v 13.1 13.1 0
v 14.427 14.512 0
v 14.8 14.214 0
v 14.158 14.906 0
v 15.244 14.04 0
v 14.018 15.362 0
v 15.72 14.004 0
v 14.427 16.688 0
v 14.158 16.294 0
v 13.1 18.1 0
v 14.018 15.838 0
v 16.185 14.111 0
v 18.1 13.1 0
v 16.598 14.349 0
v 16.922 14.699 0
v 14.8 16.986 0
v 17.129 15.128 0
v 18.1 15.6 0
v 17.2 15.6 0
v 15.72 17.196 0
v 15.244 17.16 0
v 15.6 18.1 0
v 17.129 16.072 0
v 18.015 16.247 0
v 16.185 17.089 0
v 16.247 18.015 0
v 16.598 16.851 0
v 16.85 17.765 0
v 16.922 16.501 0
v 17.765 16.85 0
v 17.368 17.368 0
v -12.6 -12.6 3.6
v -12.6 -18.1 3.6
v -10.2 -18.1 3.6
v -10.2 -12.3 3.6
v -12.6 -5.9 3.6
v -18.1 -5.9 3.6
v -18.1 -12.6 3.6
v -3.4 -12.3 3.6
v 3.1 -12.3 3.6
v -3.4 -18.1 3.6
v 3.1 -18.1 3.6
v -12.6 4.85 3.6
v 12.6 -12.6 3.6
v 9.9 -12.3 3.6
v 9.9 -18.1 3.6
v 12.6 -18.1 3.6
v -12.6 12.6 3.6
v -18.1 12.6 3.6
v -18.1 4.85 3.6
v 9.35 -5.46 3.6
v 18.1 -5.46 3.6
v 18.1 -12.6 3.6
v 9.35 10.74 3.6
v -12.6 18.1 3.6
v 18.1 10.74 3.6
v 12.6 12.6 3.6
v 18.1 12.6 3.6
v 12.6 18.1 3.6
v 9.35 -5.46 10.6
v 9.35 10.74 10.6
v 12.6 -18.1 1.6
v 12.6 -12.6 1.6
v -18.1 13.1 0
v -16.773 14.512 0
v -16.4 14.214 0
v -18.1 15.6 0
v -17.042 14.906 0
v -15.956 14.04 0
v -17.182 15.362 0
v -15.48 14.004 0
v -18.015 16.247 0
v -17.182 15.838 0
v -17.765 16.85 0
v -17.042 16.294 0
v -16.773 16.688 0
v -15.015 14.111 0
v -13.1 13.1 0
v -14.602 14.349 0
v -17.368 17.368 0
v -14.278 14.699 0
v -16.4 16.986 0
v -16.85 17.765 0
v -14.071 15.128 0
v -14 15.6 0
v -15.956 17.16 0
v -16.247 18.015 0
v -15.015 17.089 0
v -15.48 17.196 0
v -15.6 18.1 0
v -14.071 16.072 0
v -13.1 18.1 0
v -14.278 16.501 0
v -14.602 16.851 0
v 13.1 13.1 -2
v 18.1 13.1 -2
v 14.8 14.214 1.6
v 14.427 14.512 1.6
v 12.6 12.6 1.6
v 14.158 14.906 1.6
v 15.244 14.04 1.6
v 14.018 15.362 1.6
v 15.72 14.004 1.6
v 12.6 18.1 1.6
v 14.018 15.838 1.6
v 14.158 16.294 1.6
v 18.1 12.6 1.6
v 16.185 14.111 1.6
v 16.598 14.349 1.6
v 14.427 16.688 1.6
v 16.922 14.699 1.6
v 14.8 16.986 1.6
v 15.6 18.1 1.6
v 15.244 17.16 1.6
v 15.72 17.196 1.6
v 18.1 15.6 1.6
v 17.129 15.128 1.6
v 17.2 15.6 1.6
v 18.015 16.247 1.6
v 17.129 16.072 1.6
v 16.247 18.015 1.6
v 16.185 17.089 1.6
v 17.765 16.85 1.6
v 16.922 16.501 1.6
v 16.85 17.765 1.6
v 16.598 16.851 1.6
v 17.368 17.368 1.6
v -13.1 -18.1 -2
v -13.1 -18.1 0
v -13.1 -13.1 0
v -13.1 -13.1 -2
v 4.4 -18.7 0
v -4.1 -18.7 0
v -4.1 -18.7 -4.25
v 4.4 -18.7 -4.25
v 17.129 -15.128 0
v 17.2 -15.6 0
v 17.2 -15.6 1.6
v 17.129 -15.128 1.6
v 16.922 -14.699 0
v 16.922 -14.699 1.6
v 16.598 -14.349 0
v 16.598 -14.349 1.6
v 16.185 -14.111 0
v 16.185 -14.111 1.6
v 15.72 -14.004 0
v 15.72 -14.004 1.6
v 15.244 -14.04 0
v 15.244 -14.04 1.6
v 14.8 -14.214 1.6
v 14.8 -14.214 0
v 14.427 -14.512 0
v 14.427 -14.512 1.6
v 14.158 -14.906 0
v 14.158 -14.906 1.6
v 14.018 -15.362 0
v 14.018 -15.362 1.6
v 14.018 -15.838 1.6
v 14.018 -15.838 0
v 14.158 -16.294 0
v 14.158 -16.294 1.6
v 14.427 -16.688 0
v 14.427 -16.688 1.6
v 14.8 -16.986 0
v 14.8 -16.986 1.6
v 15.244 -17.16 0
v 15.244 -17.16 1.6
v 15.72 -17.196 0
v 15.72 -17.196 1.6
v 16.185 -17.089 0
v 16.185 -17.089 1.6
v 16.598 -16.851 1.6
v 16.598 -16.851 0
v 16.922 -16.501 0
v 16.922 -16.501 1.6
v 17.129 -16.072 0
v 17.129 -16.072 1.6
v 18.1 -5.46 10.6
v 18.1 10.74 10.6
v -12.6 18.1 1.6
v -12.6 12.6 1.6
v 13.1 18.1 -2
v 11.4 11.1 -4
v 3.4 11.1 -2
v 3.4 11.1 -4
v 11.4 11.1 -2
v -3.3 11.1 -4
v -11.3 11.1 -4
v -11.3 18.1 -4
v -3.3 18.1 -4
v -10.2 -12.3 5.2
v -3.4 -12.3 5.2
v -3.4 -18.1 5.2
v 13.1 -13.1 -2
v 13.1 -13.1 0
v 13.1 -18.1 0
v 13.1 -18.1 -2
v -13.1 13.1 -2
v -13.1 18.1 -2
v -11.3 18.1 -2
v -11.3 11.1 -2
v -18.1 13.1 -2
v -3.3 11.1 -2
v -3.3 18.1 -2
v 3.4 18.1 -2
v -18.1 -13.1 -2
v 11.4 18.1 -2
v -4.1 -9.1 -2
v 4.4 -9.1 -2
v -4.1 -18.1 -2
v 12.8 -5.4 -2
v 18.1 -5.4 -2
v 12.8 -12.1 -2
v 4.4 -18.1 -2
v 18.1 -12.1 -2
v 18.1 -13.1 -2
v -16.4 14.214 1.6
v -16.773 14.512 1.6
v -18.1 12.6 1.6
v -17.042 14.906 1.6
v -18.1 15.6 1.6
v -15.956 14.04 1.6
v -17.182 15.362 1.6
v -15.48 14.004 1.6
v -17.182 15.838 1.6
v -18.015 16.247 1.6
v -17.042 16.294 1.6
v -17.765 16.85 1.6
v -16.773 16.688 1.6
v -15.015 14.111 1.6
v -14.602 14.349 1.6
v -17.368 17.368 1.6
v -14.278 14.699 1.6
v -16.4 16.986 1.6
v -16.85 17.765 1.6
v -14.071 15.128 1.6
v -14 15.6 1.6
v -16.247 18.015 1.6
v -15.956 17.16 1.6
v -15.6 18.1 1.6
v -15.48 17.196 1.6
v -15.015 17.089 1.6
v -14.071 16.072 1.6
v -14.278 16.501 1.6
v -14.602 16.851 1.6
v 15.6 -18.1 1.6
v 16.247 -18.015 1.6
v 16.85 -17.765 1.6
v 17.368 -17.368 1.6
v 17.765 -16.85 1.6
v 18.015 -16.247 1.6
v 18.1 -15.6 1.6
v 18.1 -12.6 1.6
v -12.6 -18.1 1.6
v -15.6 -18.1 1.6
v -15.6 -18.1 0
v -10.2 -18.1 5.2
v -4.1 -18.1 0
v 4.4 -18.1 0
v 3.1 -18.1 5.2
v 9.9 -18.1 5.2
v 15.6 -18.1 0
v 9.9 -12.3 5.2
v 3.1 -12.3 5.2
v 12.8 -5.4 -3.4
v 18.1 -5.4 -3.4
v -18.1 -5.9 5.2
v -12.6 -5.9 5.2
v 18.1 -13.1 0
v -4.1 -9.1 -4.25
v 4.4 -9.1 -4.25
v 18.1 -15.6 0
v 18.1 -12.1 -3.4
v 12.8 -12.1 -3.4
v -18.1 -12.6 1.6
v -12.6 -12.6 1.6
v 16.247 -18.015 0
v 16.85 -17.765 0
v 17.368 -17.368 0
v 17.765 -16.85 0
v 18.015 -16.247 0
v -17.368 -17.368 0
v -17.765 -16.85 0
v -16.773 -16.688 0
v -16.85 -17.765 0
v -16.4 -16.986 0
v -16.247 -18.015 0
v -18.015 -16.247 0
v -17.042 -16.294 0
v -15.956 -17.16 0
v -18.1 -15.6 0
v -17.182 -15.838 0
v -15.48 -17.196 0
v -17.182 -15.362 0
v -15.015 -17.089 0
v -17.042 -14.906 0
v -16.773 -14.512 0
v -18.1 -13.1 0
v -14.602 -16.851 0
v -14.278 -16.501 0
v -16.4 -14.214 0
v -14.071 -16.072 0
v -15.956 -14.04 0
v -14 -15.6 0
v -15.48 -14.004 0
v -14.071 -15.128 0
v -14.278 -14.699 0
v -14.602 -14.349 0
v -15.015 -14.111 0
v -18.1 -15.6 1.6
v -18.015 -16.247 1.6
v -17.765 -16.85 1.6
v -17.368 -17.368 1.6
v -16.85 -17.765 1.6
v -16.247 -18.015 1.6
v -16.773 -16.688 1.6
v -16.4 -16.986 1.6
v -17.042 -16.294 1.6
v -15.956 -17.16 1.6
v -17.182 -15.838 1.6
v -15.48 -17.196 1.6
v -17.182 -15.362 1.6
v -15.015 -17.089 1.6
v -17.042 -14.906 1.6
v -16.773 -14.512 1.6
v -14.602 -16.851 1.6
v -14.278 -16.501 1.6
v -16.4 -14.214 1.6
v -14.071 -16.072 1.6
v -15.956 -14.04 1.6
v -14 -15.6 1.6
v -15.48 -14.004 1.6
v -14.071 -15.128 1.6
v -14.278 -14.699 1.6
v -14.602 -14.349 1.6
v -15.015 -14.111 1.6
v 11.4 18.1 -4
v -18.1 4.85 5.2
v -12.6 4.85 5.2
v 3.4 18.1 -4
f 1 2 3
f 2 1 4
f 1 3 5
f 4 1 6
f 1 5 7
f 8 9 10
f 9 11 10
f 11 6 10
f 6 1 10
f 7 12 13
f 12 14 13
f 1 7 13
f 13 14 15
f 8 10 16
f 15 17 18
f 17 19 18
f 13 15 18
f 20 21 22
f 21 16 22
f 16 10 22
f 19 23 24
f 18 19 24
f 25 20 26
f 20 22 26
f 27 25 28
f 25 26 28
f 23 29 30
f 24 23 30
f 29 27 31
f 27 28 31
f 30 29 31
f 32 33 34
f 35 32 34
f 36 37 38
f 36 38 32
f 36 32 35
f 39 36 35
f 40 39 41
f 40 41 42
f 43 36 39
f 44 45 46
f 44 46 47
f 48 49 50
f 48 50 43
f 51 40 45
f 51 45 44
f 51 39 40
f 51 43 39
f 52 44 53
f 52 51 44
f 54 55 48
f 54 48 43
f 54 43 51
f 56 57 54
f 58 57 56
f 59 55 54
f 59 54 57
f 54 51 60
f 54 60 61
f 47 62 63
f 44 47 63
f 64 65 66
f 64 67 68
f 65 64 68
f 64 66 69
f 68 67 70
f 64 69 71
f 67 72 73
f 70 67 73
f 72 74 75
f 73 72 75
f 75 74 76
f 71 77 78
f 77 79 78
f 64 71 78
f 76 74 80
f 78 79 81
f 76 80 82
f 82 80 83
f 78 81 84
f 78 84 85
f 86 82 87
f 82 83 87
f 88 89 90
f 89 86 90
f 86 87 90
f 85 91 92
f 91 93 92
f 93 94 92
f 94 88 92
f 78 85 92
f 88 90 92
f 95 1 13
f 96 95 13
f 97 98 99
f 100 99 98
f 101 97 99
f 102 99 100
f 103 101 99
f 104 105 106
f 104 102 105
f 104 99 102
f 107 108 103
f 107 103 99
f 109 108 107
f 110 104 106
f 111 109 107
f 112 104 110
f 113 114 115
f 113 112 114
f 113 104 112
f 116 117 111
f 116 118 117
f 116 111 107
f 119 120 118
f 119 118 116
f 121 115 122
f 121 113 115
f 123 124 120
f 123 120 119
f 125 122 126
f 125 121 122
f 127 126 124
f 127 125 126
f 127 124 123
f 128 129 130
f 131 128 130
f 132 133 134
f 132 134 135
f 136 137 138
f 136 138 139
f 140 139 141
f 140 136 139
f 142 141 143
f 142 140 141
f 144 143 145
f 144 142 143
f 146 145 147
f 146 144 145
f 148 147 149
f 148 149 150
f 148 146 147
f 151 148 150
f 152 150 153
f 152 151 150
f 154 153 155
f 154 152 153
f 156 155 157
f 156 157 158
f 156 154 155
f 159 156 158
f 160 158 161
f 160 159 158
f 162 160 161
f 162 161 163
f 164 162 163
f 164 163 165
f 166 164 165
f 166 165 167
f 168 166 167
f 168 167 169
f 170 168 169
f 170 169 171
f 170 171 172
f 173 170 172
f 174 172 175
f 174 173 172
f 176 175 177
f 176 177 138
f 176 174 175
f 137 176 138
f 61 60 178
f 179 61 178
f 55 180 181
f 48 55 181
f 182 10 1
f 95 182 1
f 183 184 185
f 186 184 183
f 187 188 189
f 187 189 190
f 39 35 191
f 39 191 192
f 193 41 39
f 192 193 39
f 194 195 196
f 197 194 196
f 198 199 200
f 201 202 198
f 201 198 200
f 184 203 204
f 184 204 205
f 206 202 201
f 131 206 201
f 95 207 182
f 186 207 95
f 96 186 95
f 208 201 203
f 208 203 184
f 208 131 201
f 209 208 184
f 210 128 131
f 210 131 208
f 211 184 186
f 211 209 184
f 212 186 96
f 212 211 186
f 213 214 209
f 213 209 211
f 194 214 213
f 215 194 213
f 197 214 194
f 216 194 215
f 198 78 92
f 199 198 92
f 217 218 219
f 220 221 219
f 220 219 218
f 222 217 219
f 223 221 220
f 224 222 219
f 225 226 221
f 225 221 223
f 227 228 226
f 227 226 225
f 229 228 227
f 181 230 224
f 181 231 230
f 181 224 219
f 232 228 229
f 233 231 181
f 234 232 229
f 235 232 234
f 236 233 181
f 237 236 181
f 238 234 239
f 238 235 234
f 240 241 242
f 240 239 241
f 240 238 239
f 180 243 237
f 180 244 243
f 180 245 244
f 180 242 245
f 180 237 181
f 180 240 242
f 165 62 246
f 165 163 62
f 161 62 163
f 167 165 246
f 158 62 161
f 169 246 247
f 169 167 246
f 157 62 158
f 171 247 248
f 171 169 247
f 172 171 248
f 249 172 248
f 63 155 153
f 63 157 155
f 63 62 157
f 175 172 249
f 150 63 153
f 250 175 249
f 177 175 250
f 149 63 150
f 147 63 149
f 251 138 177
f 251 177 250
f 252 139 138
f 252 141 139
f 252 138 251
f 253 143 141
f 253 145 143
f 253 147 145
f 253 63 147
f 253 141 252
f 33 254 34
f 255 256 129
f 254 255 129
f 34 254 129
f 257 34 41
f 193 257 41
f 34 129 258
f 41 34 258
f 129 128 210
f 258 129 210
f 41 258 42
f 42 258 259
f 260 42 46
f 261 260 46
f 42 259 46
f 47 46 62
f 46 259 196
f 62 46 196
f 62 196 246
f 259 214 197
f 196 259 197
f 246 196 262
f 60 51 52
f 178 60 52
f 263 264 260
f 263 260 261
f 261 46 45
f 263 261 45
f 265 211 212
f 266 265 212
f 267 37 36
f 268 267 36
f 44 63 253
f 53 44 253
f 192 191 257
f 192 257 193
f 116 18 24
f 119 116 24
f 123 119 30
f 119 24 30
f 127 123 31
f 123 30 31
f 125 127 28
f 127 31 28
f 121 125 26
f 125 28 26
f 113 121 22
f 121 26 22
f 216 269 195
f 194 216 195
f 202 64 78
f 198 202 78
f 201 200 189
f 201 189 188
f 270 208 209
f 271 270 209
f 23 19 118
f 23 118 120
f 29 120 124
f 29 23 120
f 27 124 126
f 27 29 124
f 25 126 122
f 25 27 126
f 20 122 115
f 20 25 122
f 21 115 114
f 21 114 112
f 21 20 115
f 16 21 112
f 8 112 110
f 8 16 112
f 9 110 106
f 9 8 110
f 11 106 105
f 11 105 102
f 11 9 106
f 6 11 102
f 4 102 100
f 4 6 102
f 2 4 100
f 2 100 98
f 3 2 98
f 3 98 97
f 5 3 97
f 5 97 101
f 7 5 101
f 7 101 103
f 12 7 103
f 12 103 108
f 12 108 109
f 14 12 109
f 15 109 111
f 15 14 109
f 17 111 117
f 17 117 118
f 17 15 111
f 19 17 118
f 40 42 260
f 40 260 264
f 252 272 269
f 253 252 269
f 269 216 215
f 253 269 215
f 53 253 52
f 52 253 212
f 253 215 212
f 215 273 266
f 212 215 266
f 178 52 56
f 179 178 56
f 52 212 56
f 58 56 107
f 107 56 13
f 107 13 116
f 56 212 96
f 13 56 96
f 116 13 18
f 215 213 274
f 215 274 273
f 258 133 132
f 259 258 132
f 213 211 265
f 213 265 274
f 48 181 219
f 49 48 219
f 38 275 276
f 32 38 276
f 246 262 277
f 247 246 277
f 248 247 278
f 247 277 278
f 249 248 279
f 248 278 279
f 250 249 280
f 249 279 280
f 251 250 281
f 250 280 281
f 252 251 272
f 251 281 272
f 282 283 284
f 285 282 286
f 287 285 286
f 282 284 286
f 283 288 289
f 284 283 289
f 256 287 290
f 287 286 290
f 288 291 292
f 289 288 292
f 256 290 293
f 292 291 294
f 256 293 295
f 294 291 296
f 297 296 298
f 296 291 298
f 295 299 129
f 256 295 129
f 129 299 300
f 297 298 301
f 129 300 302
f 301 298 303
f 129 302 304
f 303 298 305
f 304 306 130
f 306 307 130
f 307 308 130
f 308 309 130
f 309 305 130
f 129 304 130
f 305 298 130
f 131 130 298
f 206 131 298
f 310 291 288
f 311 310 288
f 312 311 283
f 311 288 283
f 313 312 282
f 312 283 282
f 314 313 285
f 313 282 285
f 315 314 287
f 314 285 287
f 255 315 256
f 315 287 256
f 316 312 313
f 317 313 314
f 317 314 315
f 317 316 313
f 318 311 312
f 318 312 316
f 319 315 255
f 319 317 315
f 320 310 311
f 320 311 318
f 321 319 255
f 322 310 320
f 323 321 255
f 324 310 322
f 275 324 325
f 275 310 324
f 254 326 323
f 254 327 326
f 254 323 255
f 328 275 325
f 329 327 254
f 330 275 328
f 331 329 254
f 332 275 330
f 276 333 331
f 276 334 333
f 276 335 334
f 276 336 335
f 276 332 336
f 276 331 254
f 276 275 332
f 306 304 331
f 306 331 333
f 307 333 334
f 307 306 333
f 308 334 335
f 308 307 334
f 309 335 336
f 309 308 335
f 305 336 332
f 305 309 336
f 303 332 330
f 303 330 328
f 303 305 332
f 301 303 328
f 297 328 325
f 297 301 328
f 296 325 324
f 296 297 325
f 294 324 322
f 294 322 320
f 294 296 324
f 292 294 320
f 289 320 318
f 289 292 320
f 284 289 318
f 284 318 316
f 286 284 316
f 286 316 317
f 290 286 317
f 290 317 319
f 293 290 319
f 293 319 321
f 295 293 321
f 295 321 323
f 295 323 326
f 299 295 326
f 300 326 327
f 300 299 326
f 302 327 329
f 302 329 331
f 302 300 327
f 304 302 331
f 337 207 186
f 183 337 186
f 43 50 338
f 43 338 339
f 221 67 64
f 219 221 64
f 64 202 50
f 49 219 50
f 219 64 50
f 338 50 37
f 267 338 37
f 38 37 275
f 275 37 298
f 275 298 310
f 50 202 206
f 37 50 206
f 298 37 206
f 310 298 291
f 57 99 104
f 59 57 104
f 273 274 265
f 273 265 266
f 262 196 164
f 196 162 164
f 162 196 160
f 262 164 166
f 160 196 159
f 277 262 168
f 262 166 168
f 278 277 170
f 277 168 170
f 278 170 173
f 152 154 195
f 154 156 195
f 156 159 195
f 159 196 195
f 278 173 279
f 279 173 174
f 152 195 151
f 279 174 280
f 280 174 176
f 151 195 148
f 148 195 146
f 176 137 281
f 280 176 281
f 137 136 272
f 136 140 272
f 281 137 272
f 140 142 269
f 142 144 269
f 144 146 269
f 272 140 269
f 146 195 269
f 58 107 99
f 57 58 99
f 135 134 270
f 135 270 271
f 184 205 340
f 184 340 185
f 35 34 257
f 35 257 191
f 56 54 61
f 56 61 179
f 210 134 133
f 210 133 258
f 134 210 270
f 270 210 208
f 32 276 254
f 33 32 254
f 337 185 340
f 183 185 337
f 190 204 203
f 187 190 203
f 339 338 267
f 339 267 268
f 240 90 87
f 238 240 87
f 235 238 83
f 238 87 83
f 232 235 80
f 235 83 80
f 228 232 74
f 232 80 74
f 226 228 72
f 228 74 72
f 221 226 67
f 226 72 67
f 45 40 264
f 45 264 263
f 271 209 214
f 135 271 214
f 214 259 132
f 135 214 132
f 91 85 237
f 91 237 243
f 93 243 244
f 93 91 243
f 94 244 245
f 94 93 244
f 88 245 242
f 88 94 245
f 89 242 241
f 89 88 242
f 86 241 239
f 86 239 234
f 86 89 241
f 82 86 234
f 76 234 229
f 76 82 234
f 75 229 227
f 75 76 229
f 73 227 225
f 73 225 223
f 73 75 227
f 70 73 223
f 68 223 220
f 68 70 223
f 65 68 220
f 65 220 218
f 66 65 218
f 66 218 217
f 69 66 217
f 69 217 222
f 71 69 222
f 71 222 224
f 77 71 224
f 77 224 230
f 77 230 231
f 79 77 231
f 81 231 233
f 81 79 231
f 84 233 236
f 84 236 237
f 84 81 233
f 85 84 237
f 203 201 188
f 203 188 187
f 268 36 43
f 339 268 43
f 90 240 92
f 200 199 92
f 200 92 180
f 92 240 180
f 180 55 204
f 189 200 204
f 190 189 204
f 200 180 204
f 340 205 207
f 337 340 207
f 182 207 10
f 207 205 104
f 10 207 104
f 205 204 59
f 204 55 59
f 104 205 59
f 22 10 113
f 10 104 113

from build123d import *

# Parameters (mm, degrees)
F0_R      = 1.6
F1_DEPTH  = 1.6
F2_W      = 5.5
F2_H      = 10.75
F2_W_2    = 6.8
F2_H_2    = 5.8
F3_DEPTH  = 3.6
F2_W_3    = 8.75
F2_H_3    = 16.2
F4_DEPTH  = 9
F5_DEPTH  = 2
F7_DEPTH  = 2
F6_W      = 8.5
F6_H      = 0.6
F6_H_2    = 9
F8_DEPTH  = 4.25
F6_W_2    = 5.3
F6_H_3    = 6.7
F9_DEPTH  = 3.4
F6_W_3    = 8
F6_H_4    = 7
F10_DEPTH = 4


with BuildPart() as f1:
    # F0 (on Top) → F1 (new body)
    with BuildSketch(Plane.XY):
        with BuildLine():
            Line((15.6, 18.1), (-15.6, 18.1))
            ThreePointArc((-15.6, 18.1), (-17.367767, 17.367767), (-18.1, 15.6))
            Line((-18.1, 15.6), (-18.1, -15.6))
            ThreePointArc((-18.1, -15.6), (-17.367767, -17.367767), (-15.6, -18.1))
            Line((-15.6, -18.1), (15.6, -18.1))
            ThreePointArc((15.6, -18.1), (17.367767, -17.367767), (18.1, -15.6))
            Line((18.1, -15.6), (18.1, 15.6))
            ThreePointArc((18.1, 15.6), (17.367767, 17.367767), (15.6, 18.1))
        make_face()
        with Locations((-15.6, -15.6)):
            Circle(F0_R, mode=Mode.SUBTRACT)
        with Locations((15.6, -15.6)):
            Circle(F0_R, mode=Mode.SUBTRACT)
        with Locations((-15.6, 15.6)):
            Circle(F0_R, mode=Mode.SUBTRACT)
        with Locations((15.6, 15.6)):
            Circle(F0_R, mode=Mode.SUBTRACT)
    extrude(amount=F1_DEPTH)

    # F2 (on face) → F3 (join)
    with BuildSketch(Plane.XY.offset(1.6)):
        with Locations((-15.35, -0.525)):
            Rectangle(F2_W, F2_H)
        with Locations((-6.8, -15.2)):
            Rectangle(F2_W_2, F2_H_2)
        with Locations((6.5, -15.2)):
            Rectangle(F2_W_2, F2_H_2)
    extrude(amount=F3_DEPTH)

    # F2 (on face) → F4 (join)
    with BuildSketch(Plane.XY.offset(1.6)):
        with Locations((13.725, 2.64)):
            Rectangle(F2_W_3, F2_H_3)
    extrude(amount=F4_DEPTH)

    # F2 (on face) → F5 (join)
    with BuildSketch(Plane.XY.offset(1.6)):
        Polygon((-12.6, -5.9), (-18.1, -5.9), (-18.1, -12.6), (-12.6, -12.6), (-12.6, -18.1), (-10.2, -18.1), (-10.2, -12.3), (-3.4, -12.3), (-3.4, -18.1), (3.1, -18.1), (3.1, -12.3), (9.9, -12.3), (9.9, -18.1), (12.6, -18.1), (12.6, -12.6), (18.1, -12.6), (18.1, -5.46), (9.35, -5.46), (9.35, 10.74), (18.1, 10.74), (18.1, 12.6), (12.6, 12.6), (12.6, 18.1), (-12.6, 18.1), (-12.6, 12.6), (-18.1, 12.6), (-18.1, 4.85), (-12.6, 4.85), align=None)
    extrude(amount=F5_DEPTH)

    # F6 (on face) → F7 (join)
    with BuildSketch(Plane(origin=(0, 0, 0), x_dir=(1, 0, 0), z_dir=(0, 0, -1))):
        Polygon((12.8, 12.1), (18.1, 12.1), (18.1, 13.1), (13.1, 13.1), (13.1, 18.1), (4.4, 18.1), (4.4, 9.1), (-4.1, 9.1), (-4.1, 18.1), (-13.1, 18.1), (-13.1, 13.1), (-18.1, 13.1), (-18.1, -13.1), (-13.1, -13.1), (-13.1, -18.1), (-11.3, -18.1), (-11.3, -11.1), (-3.3, -11.1), (-3.3, -18.1), (3.4, -18.1), (3.4, -11.1), (11.4, -11.1), (11.4, -18.1), (13.1, -18.1), (13.1, -13.1), (18.1, -13.1), (18.1, 5.4), (12.8, 5.4), align=None)
    extrude(amount=F7_DEPTH)

    # F6 (on face) → F8 (join)
    with BuildSketch(Plane(origin=(0, 0, 0), x_dir=(1, 0, 0), z_dir=(0, 0, -1))):
        with Locations((0.15, 18.4)):
            Rectangle(F6_W, F6_H)
        with Locations((0.15, 13.6)):
            Rectangle(F6_W, F6_H_2)
    extrude(amount=F8_DEPTH)

    # F6 (on face) → F9 (join)
    with BuildSketch(Plane(origin=(0, 0, 0), x_dir=(1, 0, 0), z_dir=(0, 0, -1))):
        with Locations((15.45, 8.75)):
            Rectangle(F6_W_2, F6_H_3)
    extrude(amount=F9_DEPTH)

    # F6 (on face) → F10 (join)
    with BuildSketch(Plane(origin=(0, 0, 0), x_dir=(1, 0, 0), z_dir=(0, 0, -1))):
        with Locations((7.4, -14.6)):
            Rectangle(F6_W_3, F6_H_4)
        with Locations((-7.3, -14.6)):
            Rectangle(F6_W_3, F6_H_4)
    extrude(amount=F10_DEPTH)


solid = f1.part
